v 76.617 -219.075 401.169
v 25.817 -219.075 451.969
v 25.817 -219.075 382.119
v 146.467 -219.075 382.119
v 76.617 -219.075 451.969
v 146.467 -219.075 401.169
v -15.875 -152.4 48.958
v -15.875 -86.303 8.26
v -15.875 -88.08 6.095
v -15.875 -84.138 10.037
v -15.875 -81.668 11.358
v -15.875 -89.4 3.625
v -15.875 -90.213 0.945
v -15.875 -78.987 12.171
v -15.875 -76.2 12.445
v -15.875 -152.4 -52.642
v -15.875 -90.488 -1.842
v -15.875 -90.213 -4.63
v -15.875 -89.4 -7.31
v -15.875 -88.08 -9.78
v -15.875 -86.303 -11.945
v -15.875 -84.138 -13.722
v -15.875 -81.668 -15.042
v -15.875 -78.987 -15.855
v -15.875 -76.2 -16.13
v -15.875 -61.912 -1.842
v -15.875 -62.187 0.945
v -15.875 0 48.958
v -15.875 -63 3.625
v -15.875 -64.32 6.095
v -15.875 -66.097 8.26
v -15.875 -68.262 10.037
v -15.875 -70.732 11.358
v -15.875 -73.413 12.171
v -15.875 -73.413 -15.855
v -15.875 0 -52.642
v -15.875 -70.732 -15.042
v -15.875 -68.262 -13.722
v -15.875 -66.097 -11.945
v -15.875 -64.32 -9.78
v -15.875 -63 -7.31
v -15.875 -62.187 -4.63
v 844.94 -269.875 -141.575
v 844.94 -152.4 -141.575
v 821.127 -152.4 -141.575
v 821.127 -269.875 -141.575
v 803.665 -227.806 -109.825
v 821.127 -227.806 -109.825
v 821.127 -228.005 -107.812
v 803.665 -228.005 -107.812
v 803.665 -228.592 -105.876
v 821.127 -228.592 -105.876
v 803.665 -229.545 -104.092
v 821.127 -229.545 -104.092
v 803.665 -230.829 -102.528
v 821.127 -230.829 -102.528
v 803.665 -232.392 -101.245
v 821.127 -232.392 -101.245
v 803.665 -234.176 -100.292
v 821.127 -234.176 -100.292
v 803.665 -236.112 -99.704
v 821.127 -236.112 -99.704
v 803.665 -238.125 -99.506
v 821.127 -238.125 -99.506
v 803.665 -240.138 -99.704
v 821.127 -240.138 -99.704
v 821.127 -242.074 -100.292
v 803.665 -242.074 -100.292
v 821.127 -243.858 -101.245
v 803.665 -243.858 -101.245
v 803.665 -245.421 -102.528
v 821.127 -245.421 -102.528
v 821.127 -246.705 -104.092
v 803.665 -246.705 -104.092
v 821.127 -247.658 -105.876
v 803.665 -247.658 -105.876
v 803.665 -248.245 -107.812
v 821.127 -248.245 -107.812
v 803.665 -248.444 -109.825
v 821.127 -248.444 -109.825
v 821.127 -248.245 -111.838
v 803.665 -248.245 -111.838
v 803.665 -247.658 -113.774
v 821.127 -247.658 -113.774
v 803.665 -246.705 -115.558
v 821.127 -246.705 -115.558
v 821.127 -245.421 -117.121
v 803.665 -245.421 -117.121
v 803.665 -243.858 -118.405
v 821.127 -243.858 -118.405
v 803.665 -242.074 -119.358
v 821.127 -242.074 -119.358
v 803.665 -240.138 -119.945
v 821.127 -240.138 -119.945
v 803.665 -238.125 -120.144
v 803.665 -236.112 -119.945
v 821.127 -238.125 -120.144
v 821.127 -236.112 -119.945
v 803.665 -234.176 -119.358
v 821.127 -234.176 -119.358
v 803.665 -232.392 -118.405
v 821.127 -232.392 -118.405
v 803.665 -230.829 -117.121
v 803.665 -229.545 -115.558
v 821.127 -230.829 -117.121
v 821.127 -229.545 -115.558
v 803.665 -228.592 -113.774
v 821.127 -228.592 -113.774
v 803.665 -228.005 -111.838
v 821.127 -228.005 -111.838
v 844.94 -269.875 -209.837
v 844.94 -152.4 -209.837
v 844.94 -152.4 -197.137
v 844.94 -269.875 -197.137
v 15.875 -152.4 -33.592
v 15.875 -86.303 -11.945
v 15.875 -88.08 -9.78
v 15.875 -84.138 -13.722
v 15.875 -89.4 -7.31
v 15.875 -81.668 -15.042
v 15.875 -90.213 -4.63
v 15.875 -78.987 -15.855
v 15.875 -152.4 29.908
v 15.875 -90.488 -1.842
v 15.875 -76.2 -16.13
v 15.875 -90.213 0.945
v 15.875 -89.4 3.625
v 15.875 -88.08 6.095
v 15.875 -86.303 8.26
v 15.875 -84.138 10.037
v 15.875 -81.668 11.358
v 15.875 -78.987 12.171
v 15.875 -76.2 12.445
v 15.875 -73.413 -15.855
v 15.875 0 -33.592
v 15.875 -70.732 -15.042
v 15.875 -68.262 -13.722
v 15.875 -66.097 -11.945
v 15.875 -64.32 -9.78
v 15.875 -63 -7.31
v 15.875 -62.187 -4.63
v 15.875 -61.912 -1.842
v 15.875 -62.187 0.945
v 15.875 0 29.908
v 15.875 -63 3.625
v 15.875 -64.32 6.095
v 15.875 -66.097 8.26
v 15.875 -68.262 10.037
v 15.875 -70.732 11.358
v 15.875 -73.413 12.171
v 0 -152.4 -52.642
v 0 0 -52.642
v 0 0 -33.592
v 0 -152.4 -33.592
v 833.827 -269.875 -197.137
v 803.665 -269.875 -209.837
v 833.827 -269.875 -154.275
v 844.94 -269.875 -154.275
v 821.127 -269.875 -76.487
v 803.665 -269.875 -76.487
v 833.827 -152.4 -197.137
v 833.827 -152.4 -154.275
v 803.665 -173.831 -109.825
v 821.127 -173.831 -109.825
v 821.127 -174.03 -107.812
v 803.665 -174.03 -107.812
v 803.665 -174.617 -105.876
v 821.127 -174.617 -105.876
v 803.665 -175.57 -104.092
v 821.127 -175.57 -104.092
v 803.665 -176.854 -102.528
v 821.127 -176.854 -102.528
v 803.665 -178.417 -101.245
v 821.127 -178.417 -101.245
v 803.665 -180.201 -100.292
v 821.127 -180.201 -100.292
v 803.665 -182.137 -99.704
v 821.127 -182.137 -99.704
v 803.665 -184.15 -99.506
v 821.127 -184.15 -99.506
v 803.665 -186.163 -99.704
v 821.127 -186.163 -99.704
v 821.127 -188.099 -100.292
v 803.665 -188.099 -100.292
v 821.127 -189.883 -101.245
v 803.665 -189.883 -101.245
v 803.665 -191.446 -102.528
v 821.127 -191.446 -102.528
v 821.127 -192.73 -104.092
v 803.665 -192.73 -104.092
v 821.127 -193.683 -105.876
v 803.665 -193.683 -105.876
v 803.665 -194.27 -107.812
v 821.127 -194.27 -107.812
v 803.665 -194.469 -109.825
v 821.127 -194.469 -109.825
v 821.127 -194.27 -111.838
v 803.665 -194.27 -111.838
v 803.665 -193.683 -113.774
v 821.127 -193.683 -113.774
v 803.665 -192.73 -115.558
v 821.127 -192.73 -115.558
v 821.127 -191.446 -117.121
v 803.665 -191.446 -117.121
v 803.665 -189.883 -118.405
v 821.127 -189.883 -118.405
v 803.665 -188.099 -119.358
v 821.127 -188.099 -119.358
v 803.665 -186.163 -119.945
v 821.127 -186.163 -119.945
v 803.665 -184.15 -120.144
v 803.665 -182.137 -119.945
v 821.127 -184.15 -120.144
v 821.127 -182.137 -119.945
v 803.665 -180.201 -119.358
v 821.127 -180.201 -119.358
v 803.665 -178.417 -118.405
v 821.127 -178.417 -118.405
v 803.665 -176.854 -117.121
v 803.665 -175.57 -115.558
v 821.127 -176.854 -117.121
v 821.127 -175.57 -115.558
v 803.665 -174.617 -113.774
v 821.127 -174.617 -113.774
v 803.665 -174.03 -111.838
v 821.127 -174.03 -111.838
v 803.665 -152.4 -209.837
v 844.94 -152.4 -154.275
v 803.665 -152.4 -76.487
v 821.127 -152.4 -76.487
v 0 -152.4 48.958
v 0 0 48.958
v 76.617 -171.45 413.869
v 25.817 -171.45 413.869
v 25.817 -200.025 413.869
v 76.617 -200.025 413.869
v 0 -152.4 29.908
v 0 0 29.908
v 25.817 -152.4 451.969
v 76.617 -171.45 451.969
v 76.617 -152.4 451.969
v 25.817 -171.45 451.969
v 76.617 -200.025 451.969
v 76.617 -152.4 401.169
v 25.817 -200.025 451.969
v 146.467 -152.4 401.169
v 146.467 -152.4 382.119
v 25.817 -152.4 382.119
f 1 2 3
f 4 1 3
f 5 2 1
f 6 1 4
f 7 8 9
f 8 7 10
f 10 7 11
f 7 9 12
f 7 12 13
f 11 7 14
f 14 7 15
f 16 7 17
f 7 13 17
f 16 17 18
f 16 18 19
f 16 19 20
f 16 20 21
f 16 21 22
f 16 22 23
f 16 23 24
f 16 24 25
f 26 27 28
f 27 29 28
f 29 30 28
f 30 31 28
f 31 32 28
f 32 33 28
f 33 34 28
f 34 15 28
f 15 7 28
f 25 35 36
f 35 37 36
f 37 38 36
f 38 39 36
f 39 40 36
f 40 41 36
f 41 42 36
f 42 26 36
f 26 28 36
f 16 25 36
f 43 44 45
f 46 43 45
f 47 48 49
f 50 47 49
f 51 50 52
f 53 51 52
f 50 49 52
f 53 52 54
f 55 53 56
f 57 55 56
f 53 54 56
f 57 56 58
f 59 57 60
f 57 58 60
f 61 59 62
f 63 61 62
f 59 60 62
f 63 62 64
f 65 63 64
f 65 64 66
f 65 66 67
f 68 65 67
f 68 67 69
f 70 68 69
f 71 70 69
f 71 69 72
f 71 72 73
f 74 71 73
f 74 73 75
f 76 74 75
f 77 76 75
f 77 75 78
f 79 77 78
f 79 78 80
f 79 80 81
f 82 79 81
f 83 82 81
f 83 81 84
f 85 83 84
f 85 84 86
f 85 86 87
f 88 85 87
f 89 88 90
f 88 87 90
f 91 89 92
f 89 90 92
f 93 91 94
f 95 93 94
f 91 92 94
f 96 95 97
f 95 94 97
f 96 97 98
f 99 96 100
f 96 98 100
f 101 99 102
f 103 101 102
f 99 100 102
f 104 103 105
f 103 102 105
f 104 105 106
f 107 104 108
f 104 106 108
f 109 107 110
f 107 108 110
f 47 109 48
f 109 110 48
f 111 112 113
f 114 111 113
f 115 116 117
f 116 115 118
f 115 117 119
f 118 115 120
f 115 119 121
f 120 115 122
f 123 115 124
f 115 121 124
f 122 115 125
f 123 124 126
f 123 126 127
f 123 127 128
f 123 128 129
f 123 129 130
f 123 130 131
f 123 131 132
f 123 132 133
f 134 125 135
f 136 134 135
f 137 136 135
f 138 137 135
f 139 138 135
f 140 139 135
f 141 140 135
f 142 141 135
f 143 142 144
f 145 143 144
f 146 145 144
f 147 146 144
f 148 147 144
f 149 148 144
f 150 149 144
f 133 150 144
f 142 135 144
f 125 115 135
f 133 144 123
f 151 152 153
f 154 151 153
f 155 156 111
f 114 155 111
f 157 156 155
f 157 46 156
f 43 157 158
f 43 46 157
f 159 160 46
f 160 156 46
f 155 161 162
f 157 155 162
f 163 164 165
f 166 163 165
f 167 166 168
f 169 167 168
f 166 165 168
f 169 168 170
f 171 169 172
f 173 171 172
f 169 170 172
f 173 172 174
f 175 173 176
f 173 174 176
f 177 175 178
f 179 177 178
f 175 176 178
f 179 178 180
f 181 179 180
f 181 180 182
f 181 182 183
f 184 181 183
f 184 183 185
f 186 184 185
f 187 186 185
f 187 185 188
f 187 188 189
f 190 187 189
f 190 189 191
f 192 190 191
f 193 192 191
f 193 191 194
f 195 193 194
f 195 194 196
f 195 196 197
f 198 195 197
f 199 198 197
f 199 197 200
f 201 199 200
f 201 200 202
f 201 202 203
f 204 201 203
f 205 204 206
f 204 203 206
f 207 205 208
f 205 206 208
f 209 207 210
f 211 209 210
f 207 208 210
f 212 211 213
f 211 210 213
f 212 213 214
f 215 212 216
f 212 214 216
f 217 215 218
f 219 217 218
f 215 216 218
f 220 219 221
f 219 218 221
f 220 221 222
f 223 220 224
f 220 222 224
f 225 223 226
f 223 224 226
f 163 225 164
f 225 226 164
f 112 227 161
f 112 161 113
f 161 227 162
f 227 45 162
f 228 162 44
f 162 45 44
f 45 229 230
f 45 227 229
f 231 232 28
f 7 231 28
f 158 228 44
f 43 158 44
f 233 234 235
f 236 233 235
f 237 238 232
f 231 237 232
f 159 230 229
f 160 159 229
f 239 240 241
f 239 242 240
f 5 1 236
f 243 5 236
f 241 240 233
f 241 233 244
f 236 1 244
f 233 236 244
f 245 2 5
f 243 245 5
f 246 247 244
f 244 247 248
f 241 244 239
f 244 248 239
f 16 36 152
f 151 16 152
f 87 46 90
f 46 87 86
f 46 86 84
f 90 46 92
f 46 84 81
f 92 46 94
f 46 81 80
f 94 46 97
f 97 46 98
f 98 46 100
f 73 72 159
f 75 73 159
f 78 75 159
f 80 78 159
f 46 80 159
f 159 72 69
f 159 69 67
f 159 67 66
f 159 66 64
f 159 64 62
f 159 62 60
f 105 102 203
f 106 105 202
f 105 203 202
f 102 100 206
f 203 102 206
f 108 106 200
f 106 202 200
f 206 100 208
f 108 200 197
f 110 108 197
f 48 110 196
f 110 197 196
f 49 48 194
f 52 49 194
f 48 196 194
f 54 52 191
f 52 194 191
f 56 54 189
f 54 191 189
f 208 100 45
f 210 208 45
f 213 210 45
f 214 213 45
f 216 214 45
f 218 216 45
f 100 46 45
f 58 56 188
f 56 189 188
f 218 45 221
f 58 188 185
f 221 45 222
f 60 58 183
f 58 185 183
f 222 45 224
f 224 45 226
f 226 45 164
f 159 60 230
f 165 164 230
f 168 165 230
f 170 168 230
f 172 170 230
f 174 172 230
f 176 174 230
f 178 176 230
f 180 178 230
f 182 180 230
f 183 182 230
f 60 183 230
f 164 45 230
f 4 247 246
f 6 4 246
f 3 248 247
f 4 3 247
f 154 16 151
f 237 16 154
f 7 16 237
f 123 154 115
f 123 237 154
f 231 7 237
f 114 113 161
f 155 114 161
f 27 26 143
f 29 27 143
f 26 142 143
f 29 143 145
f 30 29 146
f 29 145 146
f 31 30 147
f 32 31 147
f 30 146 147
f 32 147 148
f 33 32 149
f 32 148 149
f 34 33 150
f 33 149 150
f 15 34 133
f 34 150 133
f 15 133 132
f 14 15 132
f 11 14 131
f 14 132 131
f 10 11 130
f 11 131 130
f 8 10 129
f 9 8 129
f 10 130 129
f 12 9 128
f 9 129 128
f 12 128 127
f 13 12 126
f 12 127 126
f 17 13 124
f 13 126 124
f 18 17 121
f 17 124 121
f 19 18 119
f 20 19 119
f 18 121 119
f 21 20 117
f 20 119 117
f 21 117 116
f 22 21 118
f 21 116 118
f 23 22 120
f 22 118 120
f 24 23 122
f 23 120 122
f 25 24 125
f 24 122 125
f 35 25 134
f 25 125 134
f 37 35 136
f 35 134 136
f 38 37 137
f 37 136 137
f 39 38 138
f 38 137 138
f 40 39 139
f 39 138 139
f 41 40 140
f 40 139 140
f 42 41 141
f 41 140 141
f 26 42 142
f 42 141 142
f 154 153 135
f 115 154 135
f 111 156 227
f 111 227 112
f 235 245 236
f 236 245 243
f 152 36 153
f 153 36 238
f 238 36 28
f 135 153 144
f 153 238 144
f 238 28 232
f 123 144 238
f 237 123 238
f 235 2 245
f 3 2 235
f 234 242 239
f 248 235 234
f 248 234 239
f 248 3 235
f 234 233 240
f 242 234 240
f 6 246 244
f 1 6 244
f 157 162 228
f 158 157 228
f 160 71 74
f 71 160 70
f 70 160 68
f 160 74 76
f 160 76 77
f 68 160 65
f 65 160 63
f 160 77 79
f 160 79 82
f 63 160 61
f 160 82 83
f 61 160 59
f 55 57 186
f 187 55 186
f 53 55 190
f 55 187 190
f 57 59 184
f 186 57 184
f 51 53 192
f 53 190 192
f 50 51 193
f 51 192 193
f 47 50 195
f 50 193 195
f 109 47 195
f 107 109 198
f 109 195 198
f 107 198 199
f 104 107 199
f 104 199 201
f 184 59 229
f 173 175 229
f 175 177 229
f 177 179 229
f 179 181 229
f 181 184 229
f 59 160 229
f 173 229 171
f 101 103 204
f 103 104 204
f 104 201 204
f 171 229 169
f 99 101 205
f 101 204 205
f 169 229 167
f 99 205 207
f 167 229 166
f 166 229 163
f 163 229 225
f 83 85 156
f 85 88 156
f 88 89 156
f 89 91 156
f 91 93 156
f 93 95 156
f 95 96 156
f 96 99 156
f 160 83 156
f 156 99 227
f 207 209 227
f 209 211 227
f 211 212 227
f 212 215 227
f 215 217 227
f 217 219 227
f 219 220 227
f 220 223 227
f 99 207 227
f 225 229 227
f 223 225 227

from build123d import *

# Parameters (mm, degrees)
F1_DEPTH  = 152.4
F2_R      = 14.2875
F3_DEPTH  = 25.4
F4_DEPTH  = 6.351
F6_DEPTH  = 117.475
F8_R      = 10.31875
F9_DEPTH  = 837.0034227142
F13_DEPTH = 66.675
F15_W     = 25.4
F15_H     = 19.05
F16_DEPTH = 25.4
F17_DEPTH = 25.4
F18_DEPTH = 67.0933896
F19_W     = 25.4
F19_H     = 25.4
F20_DEPTH = 19.05
F21_DEPTH = 25.4


# Not quite as in the source:
# - the program builds the solid bodies; features that only make, move or delete a surface that nothing else refers to are left out


with BuildPart() as f1:
    # F0 (on Front) → F1 (new body)
    with BuildSketch(Plane.XZ):
        Polygon((0, 48.9576303571), (-15.875, 48.9576303571), (-15.875, -52.6423696429), (0, -52.6423696429), (0, -33.5923696429), (15.875, -33.5923696429), (15.875, 29.9076303571), (0, 29.9076303571), align=None)
    extrude(amount=F1_DEPTH)

    # F2 (on face) → F3 (cut)
    with BuildSketch(Plane.YZ.offset(15.875)):
        with Locations((-76.2, -1.8423696429)):
            Circle(F2_R)
    extrude(amount=-F3_DEPTH, mode=Mode.SUBTRACT)

    # F4 (cut, through all): a face of the model
    f4_faces = [f1.faces().sort_by_distance(p)[0] for p in [
        (-9.525, -76.2, -1.8423696429),
    ]]
    extrude(f4_faces, amount=-F4_DEPTH, mode=Mode.SUBTRACT)


with BuildPart() as f6:
    # F5 (on face) → F6 (new body)
    with BuildSketch(Plane.XZ.offset(152.4)):
        Polygon((821.1274227142, -76.4874068737), (803.6649227142, -76.4874068737), (803.6649227142, -209.8374068737), (827.4774227142, -209.8374068737), (844.9399227142, -209.8374068737), (844.9399227142, -197.1374068737), (833.8274227142, -197.1374068737), (833.8274227142, -154.2749068737), (844.9399227142, -154.2749068737), (844.9399227142, -141.5749068737), (821.1274227142, -141.5749068737), align=None)
    extrude(amount=F6_DEPTH)

    # F8 (on face) → F9 (cut, through all)
    with BuildSketch(Plane.YZ.offset(821.1274227142)):
        with Locations((-184.15, -109.8249068737)):
            Circle(F8_R)
        with Locations((-238.125, -109.8249068737)):
            Circle(F8_R)
    extrude(amount=-F9_DEPTH, mode=Mode.SUBTRACT)


with BuildPart() as f13:
    # F12 (on face) → F13 (new body)
    with BuildSketch(Plane.XZ.offset(152.4)):
        Polygon((51.2173896, 426.5687932044), (25.8173896, 426.5687932044), (25.8173896, 382.1187932044), (146.4673896, 382.1187932044), (146.4673896, 401.1687932044), (51.2173896, 401.1687932044), align=None)
    extrude(amount=F13_DEPTH)

    # F15 (on face) → F16 (join)
    with BuildSketch(Plane.XY.offset(426.5687932044)):
        with Locations((38.5173896, -209.55)):
            Rectangle(F15_W, F15_H)
        with Locations((38.5173896, -161.925)):
            Rectangle(F15_W, F15_H)
    extrude(amount=F16_DEPTH)

    # F14 (on face) → F17 (join)
    with BuildSketch(Plane.YZ.offset(51.2173896)):
        Polygon((-200.025, 413.8687932044), (-200.025, 426.5687932044), (-219.075, 426.5687932044), (-219.075, 401.1687932044), (-152.4, 401.1687932044), (-152.4, 426.5687932044), (-171.45, 426.5687932044), (-171.45, 413.8687932044), align=None)
    extrude(amount=F17_DEPTH)

    # F18 (cut, through all): a face of the model
    f18_faces = [f13.faces().sort_by_distance(p)[0] for p in [
        (51.2173896, -185.7375, 420.2187932044),
    ]]
    extrude(f18_faces, amount=-F18_DEPTH, mode=Mode.SUBTRACT)

    # F19 (on face) → F20 (join)
    with BuildSketch(Plane.XZ.offset(219.075)):
        with Locations((63.9173896, 439.2687932044)):
            Rectangle(F19_W, F19_H)
    extrude(amount=-F20_DEPTH)

    # F21 (add): a face of the model
    f21_faces = [f13.faces().sort_by_distance(p)[0] for p in [
        (51.2173896, -161.925, 439.2687932044),
    ]]
    extrude(f21_faces, amount=F21_DEPTH)


solid = Compound([f1.part, f6.part, f13.part])
